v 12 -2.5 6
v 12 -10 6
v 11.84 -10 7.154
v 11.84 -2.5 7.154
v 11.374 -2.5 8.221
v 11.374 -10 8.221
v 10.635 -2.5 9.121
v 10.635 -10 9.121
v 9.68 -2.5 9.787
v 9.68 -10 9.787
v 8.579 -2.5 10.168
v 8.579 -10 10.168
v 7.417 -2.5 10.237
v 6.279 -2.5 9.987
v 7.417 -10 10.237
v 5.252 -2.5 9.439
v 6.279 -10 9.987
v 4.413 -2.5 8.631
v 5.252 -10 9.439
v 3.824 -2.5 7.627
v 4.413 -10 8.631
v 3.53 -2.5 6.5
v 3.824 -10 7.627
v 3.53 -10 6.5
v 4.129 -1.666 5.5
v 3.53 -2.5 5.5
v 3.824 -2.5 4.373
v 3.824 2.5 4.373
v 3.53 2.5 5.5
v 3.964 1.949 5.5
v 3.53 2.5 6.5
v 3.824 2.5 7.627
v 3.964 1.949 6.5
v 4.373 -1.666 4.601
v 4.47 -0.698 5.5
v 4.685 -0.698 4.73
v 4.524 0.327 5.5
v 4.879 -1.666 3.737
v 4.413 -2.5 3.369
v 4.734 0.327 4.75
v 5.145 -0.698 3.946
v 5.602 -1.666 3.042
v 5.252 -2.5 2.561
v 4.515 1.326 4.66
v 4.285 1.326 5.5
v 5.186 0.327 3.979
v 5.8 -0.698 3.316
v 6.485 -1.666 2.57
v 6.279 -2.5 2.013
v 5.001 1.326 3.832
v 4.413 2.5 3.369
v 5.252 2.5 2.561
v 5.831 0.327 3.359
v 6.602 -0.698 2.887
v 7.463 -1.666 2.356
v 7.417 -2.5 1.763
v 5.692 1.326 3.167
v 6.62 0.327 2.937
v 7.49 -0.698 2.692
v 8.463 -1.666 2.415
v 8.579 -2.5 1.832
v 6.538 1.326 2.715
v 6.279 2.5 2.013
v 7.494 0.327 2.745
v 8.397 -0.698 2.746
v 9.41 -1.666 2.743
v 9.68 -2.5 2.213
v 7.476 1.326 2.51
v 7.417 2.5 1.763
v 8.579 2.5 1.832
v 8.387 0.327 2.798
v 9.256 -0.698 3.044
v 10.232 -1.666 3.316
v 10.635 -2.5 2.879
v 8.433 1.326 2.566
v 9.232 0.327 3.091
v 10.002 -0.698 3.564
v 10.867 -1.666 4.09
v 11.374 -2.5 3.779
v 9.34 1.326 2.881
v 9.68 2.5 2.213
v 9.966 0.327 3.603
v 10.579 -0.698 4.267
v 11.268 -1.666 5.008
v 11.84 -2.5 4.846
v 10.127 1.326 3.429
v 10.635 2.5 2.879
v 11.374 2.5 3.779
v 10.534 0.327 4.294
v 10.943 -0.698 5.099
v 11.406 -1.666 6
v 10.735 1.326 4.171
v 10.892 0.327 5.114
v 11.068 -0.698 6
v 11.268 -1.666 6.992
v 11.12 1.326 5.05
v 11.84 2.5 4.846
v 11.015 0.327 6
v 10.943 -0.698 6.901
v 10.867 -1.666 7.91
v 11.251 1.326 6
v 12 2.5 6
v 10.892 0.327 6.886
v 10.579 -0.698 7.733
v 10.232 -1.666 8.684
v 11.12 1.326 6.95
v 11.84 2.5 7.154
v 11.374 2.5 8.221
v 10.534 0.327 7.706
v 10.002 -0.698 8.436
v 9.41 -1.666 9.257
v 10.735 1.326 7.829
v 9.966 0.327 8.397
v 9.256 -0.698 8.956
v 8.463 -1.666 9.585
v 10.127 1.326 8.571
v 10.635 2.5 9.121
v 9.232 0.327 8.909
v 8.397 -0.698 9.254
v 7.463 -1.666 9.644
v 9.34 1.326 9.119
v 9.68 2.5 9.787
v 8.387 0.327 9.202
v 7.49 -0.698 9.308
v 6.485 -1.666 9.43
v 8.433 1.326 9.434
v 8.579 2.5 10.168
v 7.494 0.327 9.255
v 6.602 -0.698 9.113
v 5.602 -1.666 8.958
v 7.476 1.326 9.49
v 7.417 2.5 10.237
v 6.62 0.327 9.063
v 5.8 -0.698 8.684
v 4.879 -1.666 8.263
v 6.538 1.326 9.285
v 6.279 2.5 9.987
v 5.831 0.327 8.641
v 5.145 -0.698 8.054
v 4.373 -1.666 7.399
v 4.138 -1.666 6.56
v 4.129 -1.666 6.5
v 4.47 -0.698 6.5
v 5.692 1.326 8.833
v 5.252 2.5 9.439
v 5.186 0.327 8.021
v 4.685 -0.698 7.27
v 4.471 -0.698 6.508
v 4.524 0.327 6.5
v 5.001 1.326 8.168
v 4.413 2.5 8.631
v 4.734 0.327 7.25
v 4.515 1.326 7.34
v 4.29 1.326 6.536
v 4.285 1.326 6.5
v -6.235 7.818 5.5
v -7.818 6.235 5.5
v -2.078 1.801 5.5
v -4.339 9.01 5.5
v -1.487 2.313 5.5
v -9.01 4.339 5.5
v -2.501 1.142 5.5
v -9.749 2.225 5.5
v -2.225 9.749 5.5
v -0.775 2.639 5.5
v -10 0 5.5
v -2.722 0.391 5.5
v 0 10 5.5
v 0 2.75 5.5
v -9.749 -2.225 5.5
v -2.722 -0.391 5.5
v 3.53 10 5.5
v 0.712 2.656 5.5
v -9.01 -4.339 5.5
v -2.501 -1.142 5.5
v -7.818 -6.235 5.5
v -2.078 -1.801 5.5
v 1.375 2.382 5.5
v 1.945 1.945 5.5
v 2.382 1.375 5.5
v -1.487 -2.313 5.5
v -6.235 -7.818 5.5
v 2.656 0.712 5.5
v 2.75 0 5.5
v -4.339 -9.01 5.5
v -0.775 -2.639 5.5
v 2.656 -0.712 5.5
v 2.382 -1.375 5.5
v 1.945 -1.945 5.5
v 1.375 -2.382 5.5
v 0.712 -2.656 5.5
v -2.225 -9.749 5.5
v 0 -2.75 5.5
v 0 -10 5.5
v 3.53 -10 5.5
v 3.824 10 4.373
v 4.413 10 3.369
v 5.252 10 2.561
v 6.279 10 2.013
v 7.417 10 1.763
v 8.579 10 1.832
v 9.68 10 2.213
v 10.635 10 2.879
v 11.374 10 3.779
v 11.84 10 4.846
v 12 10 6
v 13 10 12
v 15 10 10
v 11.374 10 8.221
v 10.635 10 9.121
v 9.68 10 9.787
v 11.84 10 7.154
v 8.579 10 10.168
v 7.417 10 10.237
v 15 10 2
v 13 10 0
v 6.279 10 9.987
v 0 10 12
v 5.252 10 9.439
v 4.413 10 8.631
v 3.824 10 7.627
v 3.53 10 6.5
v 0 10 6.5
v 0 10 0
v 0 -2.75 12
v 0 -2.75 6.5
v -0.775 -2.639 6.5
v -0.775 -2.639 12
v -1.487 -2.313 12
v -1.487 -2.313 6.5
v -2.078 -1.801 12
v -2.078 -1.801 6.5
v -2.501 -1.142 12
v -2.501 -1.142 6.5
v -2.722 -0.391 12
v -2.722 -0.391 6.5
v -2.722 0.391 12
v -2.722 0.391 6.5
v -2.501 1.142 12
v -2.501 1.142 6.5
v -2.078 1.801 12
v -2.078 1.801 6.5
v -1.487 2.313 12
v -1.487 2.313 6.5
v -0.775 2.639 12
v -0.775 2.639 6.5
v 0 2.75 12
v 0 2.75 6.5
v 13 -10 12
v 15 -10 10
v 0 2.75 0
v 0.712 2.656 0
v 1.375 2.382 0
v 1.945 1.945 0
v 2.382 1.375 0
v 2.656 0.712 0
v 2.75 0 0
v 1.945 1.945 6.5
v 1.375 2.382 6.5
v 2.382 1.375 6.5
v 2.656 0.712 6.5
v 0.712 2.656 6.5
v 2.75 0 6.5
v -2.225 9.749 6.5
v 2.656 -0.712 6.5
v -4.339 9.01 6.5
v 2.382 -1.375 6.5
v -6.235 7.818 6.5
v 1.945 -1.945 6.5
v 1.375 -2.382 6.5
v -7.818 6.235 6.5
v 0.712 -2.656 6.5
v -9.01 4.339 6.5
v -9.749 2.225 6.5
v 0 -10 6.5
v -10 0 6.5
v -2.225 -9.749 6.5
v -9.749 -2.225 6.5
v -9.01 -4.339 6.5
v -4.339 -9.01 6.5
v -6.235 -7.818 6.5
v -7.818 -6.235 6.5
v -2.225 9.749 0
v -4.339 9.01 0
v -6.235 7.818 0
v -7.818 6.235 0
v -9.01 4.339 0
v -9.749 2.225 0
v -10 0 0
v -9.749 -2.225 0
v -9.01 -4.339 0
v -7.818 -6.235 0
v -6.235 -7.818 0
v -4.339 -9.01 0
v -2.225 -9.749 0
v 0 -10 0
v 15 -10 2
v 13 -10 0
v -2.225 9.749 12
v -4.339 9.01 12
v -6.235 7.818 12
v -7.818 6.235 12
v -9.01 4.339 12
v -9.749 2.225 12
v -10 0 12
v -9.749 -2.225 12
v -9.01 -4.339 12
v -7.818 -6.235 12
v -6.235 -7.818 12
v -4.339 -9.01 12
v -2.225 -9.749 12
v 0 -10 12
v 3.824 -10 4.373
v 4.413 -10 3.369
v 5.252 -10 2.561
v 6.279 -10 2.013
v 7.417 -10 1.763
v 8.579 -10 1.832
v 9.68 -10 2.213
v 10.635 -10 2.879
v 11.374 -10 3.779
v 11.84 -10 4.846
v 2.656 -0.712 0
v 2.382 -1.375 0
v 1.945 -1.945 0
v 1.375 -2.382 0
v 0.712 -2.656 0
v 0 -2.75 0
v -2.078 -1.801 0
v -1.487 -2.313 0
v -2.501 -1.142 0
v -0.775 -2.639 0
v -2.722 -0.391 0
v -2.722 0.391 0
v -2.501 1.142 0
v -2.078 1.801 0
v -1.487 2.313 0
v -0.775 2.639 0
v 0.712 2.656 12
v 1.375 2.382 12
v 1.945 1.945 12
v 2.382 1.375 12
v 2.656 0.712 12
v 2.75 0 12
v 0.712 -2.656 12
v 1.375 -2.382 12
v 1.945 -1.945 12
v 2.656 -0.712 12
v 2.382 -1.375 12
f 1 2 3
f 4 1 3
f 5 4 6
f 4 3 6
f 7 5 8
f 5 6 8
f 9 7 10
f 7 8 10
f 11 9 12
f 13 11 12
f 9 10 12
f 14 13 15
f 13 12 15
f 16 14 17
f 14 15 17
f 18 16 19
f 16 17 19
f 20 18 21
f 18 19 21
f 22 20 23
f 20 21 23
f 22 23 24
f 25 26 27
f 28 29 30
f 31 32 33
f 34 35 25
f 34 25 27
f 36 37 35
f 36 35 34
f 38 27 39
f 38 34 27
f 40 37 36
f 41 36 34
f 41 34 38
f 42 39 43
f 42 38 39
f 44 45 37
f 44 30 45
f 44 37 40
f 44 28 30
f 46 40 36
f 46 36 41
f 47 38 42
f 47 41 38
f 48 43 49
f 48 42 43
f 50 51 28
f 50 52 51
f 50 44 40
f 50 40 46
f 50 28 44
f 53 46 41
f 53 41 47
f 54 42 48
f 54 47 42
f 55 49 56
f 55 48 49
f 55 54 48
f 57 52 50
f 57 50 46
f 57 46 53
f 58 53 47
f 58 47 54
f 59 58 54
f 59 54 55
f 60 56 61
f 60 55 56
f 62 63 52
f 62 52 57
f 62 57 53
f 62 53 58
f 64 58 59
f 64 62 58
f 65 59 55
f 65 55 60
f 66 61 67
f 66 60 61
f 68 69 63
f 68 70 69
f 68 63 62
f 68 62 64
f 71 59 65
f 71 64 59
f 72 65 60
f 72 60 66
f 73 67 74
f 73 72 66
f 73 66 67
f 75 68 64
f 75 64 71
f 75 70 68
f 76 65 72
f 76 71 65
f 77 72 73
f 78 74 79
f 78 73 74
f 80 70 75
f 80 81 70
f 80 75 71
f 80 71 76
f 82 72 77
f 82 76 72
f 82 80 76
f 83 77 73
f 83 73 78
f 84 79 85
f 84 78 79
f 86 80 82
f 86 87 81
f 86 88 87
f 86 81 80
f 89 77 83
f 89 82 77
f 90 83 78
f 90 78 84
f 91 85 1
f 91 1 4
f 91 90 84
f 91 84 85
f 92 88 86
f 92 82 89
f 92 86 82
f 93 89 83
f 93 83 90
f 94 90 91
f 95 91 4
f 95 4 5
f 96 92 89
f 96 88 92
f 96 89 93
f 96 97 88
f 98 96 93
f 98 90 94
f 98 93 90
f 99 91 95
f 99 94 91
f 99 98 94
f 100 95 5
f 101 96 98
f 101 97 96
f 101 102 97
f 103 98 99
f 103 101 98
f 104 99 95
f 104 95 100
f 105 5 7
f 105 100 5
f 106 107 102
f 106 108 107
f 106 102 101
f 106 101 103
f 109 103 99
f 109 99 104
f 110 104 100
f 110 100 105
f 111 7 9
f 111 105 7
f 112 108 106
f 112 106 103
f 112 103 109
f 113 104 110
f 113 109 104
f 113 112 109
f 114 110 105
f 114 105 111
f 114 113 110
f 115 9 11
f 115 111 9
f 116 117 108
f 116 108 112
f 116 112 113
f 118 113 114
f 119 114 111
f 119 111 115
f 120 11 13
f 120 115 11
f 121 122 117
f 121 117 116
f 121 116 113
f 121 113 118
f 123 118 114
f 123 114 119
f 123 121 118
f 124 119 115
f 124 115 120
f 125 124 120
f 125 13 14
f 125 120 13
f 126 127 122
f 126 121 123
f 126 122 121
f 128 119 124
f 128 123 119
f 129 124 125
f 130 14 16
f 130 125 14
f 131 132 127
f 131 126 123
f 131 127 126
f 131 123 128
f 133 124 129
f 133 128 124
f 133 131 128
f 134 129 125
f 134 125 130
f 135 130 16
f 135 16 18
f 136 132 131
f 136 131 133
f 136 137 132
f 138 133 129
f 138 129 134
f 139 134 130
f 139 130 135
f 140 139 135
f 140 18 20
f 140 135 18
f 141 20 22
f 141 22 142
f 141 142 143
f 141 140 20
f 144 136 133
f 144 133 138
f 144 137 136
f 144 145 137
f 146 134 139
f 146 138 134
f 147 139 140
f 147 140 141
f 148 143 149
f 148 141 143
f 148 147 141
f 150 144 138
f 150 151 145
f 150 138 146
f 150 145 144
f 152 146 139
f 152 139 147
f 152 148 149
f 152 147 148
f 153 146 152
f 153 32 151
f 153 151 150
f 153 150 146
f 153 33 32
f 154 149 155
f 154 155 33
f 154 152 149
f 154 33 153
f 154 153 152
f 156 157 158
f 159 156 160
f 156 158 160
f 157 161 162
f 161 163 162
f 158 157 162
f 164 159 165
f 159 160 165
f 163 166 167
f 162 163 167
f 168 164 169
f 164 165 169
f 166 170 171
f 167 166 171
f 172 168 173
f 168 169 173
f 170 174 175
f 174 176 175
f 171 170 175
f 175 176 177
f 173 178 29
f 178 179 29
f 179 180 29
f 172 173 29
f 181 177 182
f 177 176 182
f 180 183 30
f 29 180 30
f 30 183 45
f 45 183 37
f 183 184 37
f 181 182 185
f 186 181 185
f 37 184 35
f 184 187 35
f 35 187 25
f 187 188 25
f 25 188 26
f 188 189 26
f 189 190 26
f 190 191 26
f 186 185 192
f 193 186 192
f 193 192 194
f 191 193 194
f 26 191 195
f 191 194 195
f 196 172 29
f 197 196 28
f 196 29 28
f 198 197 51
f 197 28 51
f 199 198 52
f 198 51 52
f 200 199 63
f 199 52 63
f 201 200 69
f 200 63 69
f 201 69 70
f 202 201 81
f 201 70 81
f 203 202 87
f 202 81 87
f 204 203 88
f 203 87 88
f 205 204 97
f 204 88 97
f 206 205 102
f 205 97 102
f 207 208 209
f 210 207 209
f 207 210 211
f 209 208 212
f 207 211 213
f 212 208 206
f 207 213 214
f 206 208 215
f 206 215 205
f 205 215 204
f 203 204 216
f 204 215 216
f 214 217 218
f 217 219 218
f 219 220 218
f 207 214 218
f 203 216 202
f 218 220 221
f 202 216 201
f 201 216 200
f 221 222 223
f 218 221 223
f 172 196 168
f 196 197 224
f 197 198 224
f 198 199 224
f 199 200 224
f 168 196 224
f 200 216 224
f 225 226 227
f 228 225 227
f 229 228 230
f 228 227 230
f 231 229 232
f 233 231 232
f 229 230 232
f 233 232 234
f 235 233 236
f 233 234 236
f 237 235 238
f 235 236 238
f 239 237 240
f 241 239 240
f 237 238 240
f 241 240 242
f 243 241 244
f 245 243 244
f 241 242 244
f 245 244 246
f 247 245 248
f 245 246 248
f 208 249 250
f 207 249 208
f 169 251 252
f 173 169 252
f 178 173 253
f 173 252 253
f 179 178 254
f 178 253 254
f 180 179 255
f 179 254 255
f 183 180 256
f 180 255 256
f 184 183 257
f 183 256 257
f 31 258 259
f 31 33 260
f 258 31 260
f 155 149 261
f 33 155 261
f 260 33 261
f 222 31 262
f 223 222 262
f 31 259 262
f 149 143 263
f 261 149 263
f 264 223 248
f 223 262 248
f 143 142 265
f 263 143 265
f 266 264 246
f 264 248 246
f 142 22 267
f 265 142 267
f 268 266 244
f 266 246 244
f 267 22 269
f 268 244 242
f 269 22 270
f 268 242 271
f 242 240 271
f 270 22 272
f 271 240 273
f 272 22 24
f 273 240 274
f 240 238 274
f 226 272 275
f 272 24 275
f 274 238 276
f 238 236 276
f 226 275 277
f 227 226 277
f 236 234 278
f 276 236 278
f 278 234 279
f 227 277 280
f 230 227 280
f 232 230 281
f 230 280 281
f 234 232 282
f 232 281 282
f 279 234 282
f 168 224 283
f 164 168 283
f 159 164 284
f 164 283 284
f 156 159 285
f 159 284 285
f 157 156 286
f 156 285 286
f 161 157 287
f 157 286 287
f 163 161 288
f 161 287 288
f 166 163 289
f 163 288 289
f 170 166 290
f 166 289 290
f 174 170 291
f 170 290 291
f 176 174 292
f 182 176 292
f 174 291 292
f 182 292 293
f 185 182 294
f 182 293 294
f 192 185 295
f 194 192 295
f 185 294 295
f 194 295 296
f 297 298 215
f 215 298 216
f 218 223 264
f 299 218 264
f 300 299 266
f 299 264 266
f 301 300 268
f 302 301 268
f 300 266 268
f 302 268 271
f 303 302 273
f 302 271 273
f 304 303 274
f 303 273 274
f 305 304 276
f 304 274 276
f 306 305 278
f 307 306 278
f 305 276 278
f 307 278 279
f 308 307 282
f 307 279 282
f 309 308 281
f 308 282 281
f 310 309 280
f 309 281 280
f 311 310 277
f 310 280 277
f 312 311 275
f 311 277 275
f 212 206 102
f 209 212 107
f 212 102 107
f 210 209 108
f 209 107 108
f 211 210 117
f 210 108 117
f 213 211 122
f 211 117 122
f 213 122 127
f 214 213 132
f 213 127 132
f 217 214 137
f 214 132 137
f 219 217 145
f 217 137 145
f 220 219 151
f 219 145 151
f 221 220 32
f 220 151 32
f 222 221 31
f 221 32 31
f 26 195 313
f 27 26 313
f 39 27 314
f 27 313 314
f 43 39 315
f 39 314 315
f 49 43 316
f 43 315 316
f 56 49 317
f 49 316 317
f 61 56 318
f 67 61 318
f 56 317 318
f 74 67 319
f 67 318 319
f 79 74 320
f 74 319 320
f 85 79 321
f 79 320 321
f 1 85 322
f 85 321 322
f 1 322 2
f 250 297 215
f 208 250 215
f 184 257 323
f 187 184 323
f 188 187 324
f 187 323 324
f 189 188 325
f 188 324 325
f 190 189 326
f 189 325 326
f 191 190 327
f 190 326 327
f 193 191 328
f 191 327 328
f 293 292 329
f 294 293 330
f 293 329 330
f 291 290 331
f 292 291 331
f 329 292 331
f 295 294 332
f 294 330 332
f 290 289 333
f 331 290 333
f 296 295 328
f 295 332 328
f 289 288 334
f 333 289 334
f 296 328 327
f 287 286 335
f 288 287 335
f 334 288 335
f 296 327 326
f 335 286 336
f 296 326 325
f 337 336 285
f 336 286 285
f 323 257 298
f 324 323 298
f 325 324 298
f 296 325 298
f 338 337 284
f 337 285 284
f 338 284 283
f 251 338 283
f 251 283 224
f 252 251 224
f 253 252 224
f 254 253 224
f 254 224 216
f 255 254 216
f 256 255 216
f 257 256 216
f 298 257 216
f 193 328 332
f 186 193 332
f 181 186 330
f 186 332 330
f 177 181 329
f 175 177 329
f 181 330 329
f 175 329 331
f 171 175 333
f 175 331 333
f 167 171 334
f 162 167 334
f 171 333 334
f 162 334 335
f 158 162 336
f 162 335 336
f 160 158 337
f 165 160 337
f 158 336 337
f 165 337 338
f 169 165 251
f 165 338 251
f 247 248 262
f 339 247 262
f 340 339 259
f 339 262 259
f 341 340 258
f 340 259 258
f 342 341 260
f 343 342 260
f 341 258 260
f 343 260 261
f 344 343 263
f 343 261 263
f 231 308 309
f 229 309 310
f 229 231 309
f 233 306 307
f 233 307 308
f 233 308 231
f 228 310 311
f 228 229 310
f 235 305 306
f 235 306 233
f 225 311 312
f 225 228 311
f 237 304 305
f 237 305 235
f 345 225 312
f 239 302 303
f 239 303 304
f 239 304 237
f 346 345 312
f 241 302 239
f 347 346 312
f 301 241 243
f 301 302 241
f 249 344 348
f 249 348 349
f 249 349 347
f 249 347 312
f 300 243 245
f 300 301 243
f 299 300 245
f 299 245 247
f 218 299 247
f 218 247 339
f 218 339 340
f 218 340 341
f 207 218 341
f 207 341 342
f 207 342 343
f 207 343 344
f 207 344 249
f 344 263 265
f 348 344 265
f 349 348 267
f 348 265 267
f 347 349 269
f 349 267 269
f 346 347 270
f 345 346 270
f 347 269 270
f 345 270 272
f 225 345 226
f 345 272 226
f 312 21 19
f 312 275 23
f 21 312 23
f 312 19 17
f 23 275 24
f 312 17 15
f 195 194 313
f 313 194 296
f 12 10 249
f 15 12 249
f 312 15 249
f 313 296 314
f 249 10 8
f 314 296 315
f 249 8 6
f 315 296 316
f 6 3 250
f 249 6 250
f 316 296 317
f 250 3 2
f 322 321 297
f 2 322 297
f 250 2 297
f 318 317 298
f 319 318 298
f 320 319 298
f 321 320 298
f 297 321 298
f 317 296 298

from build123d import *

# Parameters (mm, degrees)
F1_DEPTH = 12
F3_DEPTH = 20.001
F4_SIZE  = 2
F2_W     = 10
F2_H     = 1
F9_DEPTH = 25


with BuildPart() as f1:
    # F0 (on Top) → F1 (new body)
    with BuildSketch(Plane.XY):
        with BuildLine():
            Line((15, 10), (0, 10))
            Line((0, 10), (0, 2.75))
            ThreePointArc((0, 2.75), (1.9445436483, 1.9445436483), (2.75, 0))
            ThreePointArc((2.75, 0), (1.9445436483, -1.9445436483), (0, -2.75))
            Line((0, -2.75), (0, -10))
            Line((0, -10), (15, -10))
            Line((15, -10), (15, 10))
        make_face()
        with BuildLine():
            Line((0, 2.75), (0, 10))
            ThreePointArc((0, 10), (-10, 0), (0, -10))
            Line((0, -10), (0, -2.75))
            ThreePointArc((0, -2.75), (-2.75, 0), (0, 2.75))
        make_face()
    extrude(amount=F1_DEPTH)

    # F2 (on face) → F3 (cut, through all)
    with BuildSketch(Plane.XZ.offset(10)):
        with BuildLine():
            Line((7.75, 6.5), (7.75, 5.5))
            Line((7.75, 5.5), (3.529514246, 5.5))
            ThreePointArc((3.529514246, 5.5), (8.0004351666, 1.7573849777), (12, 6))
            ThreePointArc((12, 6), (8.0004351666, 10.2426150223), (3.529514246, 6.5))
            Line((3.529514246, 6.5), (7.75, 6.5))
        make_face()
        with BuildLine():
            Line((3.529514246, 5.5), (7.75, 5.5))
            Line((7.75, 5.5), (7.75, 6.5))
            Line((7.75, 6.5), (3.529514246, 6.5))
            ThreePointArc((3.529514246, 6.5), (3.5, 6), (3.529514246, 5.5))
        make_face()
    extrude(amount=-F3_DEPTH, mode=Mode.SUBTRACT)

    # F4
    f4_edges = [f1.edges().sort_by_distance(p)[0] for p in [
        (15, 0, 0),
        (15, 0, 12),
    ]]
    chamfer(f4_edges, length=F4_SIZE)

    # F8: sweep along a path in F7
    with BuildLine(Plane.XZ) as f8_path:
        CenterArc((7.75, 6), 4.25, 0, 360)
    # F6 (on mid) → F8 (sweep)
    with BuildSketch(Plane.XY.offset(6)):
        with BuildLine():
            Line((3.5, 2.5), (3.5, -2.5))
            ThreePointArc((3.5, -2.5), (4.5, 0), (3.5, 2.5))
        make_face()
    sweep(path=f8_path.line)

    # F2 (on face) → F9 (cut)
    with BuildSketch(Plane.XZ.offset(10)):
        with BuildLine():
            Line((3.529514246, 5.5), (7.75, 5.5))
            Line((7.75, 5.5), (7.75, 6.5))
            Line((7.75, 6.5), (3.529514246, 6.5))
            ThreePointArc((3.529514246, 6.5), (3.5, 6), (3.529514246, 5.5))
        make_face()
        with BuildLine():
            Line((0, 5.5), (3.529514246, 5.5))
            ThreePointArc((3.529514246, 5.5), (3.5, 6), (3.529514246, 6.5))
            Line((3.529514246, 6.5), (0, 6.5))
            Line((0, 6.5), (0, 5.5))
        make_face()
        with Locations((-5, 6)):
            Rectangle(F2_W, F2_H)
    extrude(amount=-F9_DEPTH, mode=Mode.SUBTRACT)


solid = f1.part
